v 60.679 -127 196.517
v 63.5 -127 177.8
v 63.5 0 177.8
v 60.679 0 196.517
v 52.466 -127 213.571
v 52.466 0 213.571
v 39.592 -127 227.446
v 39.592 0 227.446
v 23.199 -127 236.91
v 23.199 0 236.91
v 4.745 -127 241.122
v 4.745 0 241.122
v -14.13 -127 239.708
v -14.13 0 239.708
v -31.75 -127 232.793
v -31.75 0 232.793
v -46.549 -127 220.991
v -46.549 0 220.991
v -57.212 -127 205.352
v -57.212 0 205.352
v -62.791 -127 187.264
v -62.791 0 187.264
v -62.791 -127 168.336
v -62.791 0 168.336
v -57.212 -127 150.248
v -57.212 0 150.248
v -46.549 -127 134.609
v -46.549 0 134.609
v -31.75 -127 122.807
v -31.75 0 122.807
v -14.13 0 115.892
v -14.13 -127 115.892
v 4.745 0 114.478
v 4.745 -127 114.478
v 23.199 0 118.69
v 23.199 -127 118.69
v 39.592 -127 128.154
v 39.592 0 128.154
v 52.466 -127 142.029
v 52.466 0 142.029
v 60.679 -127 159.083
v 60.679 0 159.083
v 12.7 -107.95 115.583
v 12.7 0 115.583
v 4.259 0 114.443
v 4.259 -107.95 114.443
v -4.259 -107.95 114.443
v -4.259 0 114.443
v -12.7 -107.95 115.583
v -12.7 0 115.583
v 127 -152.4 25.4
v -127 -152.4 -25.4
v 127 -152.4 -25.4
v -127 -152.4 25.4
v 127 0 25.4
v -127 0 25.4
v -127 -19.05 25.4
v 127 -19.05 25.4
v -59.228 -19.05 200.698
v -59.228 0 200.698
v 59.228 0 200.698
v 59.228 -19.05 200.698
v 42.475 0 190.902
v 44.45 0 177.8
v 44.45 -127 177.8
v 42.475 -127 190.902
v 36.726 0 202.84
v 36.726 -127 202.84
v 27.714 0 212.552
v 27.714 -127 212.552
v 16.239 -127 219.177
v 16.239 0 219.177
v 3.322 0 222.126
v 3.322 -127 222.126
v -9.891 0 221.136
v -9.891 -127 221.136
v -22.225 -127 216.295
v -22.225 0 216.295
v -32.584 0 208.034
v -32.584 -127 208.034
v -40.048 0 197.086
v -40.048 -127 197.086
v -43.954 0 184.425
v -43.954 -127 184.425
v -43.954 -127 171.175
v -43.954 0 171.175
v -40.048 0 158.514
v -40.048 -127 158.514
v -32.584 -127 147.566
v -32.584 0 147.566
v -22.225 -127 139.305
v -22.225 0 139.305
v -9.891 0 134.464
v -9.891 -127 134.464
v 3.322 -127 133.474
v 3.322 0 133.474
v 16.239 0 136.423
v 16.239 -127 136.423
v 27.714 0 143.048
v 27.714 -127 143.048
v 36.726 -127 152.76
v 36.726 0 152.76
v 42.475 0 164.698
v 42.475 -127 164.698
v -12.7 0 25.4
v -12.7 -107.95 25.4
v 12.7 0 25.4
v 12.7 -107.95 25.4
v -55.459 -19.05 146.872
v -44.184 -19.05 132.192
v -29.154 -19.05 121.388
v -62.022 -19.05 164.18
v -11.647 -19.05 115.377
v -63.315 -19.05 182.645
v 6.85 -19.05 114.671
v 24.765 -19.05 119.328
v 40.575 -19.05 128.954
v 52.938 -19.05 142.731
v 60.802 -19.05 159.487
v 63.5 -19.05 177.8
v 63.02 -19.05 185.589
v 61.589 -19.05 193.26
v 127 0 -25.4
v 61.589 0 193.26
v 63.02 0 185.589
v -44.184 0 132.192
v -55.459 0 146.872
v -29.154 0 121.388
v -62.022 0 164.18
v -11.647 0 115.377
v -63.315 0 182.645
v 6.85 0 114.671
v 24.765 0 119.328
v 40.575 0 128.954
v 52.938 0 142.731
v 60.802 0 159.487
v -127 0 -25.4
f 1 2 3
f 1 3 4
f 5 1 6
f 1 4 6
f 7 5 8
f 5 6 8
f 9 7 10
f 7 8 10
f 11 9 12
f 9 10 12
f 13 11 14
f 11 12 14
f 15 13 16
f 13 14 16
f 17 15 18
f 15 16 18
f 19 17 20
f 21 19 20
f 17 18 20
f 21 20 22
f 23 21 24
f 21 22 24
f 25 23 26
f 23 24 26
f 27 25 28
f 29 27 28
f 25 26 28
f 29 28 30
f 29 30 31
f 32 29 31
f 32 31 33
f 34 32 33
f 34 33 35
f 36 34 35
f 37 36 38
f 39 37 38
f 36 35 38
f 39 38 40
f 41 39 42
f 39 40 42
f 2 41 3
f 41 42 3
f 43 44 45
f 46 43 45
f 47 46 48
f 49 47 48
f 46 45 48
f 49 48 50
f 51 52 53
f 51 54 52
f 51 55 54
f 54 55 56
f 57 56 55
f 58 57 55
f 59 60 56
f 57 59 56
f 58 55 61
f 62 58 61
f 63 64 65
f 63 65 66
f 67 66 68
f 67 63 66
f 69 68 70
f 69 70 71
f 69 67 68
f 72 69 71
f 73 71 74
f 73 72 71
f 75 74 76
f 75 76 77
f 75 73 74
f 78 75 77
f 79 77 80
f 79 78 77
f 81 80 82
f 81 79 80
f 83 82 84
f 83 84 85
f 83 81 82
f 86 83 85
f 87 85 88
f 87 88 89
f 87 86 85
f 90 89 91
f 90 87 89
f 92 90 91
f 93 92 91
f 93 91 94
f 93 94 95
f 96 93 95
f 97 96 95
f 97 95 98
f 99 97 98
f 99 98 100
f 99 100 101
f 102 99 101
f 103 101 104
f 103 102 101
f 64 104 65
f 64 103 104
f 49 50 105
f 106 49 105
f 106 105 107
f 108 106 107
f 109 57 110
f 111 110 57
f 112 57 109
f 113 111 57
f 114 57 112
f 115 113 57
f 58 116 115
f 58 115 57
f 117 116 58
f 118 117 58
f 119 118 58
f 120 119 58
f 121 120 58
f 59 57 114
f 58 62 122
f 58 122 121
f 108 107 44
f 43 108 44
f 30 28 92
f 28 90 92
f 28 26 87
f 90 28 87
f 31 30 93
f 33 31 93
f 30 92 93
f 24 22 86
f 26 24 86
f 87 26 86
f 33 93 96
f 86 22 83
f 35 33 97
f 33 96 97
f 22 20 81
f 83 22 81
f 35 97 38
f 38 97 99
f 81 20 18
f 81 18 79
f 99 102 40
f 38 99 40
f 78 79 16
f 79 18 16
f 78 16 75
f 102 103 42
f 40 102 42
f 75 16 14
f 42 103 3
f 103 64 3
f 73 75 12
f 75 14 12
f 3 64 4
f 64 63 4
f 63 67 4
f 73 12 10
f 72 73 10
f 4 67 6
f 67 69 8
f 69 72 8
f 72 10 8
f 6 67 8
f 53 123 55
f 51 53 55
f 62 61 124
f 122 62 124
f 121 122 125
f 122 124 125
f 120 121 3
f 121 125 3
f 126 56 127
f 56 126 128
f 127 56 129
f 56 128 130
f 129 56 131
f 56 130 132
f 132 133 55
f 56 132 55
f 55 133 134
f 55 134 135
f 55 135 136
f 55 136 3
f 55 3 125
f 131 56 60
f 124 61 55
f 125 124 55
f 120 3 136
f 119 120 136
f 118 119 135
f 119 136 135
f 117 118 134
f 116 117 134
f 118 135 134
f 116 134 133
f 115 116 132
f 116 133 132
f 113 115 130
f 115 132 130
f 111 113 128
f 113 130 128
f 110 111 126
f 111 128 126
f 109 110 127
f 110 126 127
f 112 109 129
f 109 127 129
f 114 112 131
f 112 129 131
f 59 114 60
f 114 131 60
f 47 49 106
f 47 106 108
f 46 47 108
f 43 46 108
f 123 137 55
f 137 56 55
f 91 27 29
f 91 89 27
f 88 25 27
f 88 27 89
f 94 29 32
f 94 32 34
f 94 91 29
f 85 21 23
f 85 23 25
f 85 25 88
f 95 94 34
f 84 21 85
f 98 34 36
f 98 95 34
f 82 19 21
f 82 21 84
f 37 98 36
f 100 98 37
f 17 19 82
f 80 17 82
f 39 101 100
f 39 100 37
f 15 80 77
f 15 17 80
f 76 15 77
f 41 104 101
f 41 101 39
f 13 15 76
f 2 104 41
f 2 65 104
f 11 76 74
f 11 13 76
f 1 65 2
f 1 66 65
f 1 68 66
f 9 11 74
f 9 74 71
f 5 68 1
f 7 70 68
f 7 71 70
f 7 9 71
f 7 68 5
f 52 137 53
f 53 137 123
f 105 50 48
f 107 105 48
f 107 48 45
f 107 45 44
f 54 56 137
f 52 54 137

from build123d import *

# Parameters (mm, degrees)
F1_DEPTH = 152.4
F2_R     = 63.5
F2_R_2   = 44.45
F3_DEPTH = 127
F5_DEPTH = 107.95
F7_DEPTH = 19.05


with BuildPart() as f1:
    # F0 (on Front) → F1 (new body)
    with BuildSketch(Plane.XZ):
        Polygon((-127, -25.4), (127, -25.4), (127, 25.4), (9.525, 25.4), (-9.525, 25.4), (-127, 25.4), align=None)
    extrude(amount=F1_DEPTH)


with BuildPart() as f3:
    # F2 (on Front) → F3 (new body)
    with BuildSketch(Plane.XZ):
        with Locations((0, 177.8)):
            Circle(F2_R)
        with Locations((0, 177.8)):
            Circle(F2_R_2, mode=Mode.SUBTRACT)
    extrude(amount=F3_DEPTH)


with BuildPart() as f5:
    # F4 (on Front) → F5 (new body)
    with BuildSketch(Plane.XZ):
        with BuildLine():
            Line((-12.7, 115.582961), (-12.7, 25.4))
            Line((-12.7, 25.4), (12.7, 25.4))
            Line((12.7, 25.4), (12.7, 115.582961))
            ThreePointArc((12.7, 115.582961), (0, 114.3), (-12.7, 115.582961))
        make_face()
    extrude(amount=F5_DEPTH)


with BuildPart() as f7:
    # F6 (on Front) → F7 (new body)
    with BuildSketch(Plane.XZ):
        with BuildLine():
            ThreePointArc((59.227747, 200.698122), (62.4228, 189.446632), (63.5, 177.8))
            ThreePointArc((63.5, 177.8), (-11.646632, 115.3772), (-59.227747, 200.698122))
            Line((-59.227747, 200.698122), (-127, 25.4))
            Line((-127, 25.4), (127, 25.4))
            Line((127, 25.4), (59.227747, 200.698122))
        make_face()
    extrude(amount=F7_DEPTH)


solid = Compound([f1.part, f3.part, f5.part, f7.part])
